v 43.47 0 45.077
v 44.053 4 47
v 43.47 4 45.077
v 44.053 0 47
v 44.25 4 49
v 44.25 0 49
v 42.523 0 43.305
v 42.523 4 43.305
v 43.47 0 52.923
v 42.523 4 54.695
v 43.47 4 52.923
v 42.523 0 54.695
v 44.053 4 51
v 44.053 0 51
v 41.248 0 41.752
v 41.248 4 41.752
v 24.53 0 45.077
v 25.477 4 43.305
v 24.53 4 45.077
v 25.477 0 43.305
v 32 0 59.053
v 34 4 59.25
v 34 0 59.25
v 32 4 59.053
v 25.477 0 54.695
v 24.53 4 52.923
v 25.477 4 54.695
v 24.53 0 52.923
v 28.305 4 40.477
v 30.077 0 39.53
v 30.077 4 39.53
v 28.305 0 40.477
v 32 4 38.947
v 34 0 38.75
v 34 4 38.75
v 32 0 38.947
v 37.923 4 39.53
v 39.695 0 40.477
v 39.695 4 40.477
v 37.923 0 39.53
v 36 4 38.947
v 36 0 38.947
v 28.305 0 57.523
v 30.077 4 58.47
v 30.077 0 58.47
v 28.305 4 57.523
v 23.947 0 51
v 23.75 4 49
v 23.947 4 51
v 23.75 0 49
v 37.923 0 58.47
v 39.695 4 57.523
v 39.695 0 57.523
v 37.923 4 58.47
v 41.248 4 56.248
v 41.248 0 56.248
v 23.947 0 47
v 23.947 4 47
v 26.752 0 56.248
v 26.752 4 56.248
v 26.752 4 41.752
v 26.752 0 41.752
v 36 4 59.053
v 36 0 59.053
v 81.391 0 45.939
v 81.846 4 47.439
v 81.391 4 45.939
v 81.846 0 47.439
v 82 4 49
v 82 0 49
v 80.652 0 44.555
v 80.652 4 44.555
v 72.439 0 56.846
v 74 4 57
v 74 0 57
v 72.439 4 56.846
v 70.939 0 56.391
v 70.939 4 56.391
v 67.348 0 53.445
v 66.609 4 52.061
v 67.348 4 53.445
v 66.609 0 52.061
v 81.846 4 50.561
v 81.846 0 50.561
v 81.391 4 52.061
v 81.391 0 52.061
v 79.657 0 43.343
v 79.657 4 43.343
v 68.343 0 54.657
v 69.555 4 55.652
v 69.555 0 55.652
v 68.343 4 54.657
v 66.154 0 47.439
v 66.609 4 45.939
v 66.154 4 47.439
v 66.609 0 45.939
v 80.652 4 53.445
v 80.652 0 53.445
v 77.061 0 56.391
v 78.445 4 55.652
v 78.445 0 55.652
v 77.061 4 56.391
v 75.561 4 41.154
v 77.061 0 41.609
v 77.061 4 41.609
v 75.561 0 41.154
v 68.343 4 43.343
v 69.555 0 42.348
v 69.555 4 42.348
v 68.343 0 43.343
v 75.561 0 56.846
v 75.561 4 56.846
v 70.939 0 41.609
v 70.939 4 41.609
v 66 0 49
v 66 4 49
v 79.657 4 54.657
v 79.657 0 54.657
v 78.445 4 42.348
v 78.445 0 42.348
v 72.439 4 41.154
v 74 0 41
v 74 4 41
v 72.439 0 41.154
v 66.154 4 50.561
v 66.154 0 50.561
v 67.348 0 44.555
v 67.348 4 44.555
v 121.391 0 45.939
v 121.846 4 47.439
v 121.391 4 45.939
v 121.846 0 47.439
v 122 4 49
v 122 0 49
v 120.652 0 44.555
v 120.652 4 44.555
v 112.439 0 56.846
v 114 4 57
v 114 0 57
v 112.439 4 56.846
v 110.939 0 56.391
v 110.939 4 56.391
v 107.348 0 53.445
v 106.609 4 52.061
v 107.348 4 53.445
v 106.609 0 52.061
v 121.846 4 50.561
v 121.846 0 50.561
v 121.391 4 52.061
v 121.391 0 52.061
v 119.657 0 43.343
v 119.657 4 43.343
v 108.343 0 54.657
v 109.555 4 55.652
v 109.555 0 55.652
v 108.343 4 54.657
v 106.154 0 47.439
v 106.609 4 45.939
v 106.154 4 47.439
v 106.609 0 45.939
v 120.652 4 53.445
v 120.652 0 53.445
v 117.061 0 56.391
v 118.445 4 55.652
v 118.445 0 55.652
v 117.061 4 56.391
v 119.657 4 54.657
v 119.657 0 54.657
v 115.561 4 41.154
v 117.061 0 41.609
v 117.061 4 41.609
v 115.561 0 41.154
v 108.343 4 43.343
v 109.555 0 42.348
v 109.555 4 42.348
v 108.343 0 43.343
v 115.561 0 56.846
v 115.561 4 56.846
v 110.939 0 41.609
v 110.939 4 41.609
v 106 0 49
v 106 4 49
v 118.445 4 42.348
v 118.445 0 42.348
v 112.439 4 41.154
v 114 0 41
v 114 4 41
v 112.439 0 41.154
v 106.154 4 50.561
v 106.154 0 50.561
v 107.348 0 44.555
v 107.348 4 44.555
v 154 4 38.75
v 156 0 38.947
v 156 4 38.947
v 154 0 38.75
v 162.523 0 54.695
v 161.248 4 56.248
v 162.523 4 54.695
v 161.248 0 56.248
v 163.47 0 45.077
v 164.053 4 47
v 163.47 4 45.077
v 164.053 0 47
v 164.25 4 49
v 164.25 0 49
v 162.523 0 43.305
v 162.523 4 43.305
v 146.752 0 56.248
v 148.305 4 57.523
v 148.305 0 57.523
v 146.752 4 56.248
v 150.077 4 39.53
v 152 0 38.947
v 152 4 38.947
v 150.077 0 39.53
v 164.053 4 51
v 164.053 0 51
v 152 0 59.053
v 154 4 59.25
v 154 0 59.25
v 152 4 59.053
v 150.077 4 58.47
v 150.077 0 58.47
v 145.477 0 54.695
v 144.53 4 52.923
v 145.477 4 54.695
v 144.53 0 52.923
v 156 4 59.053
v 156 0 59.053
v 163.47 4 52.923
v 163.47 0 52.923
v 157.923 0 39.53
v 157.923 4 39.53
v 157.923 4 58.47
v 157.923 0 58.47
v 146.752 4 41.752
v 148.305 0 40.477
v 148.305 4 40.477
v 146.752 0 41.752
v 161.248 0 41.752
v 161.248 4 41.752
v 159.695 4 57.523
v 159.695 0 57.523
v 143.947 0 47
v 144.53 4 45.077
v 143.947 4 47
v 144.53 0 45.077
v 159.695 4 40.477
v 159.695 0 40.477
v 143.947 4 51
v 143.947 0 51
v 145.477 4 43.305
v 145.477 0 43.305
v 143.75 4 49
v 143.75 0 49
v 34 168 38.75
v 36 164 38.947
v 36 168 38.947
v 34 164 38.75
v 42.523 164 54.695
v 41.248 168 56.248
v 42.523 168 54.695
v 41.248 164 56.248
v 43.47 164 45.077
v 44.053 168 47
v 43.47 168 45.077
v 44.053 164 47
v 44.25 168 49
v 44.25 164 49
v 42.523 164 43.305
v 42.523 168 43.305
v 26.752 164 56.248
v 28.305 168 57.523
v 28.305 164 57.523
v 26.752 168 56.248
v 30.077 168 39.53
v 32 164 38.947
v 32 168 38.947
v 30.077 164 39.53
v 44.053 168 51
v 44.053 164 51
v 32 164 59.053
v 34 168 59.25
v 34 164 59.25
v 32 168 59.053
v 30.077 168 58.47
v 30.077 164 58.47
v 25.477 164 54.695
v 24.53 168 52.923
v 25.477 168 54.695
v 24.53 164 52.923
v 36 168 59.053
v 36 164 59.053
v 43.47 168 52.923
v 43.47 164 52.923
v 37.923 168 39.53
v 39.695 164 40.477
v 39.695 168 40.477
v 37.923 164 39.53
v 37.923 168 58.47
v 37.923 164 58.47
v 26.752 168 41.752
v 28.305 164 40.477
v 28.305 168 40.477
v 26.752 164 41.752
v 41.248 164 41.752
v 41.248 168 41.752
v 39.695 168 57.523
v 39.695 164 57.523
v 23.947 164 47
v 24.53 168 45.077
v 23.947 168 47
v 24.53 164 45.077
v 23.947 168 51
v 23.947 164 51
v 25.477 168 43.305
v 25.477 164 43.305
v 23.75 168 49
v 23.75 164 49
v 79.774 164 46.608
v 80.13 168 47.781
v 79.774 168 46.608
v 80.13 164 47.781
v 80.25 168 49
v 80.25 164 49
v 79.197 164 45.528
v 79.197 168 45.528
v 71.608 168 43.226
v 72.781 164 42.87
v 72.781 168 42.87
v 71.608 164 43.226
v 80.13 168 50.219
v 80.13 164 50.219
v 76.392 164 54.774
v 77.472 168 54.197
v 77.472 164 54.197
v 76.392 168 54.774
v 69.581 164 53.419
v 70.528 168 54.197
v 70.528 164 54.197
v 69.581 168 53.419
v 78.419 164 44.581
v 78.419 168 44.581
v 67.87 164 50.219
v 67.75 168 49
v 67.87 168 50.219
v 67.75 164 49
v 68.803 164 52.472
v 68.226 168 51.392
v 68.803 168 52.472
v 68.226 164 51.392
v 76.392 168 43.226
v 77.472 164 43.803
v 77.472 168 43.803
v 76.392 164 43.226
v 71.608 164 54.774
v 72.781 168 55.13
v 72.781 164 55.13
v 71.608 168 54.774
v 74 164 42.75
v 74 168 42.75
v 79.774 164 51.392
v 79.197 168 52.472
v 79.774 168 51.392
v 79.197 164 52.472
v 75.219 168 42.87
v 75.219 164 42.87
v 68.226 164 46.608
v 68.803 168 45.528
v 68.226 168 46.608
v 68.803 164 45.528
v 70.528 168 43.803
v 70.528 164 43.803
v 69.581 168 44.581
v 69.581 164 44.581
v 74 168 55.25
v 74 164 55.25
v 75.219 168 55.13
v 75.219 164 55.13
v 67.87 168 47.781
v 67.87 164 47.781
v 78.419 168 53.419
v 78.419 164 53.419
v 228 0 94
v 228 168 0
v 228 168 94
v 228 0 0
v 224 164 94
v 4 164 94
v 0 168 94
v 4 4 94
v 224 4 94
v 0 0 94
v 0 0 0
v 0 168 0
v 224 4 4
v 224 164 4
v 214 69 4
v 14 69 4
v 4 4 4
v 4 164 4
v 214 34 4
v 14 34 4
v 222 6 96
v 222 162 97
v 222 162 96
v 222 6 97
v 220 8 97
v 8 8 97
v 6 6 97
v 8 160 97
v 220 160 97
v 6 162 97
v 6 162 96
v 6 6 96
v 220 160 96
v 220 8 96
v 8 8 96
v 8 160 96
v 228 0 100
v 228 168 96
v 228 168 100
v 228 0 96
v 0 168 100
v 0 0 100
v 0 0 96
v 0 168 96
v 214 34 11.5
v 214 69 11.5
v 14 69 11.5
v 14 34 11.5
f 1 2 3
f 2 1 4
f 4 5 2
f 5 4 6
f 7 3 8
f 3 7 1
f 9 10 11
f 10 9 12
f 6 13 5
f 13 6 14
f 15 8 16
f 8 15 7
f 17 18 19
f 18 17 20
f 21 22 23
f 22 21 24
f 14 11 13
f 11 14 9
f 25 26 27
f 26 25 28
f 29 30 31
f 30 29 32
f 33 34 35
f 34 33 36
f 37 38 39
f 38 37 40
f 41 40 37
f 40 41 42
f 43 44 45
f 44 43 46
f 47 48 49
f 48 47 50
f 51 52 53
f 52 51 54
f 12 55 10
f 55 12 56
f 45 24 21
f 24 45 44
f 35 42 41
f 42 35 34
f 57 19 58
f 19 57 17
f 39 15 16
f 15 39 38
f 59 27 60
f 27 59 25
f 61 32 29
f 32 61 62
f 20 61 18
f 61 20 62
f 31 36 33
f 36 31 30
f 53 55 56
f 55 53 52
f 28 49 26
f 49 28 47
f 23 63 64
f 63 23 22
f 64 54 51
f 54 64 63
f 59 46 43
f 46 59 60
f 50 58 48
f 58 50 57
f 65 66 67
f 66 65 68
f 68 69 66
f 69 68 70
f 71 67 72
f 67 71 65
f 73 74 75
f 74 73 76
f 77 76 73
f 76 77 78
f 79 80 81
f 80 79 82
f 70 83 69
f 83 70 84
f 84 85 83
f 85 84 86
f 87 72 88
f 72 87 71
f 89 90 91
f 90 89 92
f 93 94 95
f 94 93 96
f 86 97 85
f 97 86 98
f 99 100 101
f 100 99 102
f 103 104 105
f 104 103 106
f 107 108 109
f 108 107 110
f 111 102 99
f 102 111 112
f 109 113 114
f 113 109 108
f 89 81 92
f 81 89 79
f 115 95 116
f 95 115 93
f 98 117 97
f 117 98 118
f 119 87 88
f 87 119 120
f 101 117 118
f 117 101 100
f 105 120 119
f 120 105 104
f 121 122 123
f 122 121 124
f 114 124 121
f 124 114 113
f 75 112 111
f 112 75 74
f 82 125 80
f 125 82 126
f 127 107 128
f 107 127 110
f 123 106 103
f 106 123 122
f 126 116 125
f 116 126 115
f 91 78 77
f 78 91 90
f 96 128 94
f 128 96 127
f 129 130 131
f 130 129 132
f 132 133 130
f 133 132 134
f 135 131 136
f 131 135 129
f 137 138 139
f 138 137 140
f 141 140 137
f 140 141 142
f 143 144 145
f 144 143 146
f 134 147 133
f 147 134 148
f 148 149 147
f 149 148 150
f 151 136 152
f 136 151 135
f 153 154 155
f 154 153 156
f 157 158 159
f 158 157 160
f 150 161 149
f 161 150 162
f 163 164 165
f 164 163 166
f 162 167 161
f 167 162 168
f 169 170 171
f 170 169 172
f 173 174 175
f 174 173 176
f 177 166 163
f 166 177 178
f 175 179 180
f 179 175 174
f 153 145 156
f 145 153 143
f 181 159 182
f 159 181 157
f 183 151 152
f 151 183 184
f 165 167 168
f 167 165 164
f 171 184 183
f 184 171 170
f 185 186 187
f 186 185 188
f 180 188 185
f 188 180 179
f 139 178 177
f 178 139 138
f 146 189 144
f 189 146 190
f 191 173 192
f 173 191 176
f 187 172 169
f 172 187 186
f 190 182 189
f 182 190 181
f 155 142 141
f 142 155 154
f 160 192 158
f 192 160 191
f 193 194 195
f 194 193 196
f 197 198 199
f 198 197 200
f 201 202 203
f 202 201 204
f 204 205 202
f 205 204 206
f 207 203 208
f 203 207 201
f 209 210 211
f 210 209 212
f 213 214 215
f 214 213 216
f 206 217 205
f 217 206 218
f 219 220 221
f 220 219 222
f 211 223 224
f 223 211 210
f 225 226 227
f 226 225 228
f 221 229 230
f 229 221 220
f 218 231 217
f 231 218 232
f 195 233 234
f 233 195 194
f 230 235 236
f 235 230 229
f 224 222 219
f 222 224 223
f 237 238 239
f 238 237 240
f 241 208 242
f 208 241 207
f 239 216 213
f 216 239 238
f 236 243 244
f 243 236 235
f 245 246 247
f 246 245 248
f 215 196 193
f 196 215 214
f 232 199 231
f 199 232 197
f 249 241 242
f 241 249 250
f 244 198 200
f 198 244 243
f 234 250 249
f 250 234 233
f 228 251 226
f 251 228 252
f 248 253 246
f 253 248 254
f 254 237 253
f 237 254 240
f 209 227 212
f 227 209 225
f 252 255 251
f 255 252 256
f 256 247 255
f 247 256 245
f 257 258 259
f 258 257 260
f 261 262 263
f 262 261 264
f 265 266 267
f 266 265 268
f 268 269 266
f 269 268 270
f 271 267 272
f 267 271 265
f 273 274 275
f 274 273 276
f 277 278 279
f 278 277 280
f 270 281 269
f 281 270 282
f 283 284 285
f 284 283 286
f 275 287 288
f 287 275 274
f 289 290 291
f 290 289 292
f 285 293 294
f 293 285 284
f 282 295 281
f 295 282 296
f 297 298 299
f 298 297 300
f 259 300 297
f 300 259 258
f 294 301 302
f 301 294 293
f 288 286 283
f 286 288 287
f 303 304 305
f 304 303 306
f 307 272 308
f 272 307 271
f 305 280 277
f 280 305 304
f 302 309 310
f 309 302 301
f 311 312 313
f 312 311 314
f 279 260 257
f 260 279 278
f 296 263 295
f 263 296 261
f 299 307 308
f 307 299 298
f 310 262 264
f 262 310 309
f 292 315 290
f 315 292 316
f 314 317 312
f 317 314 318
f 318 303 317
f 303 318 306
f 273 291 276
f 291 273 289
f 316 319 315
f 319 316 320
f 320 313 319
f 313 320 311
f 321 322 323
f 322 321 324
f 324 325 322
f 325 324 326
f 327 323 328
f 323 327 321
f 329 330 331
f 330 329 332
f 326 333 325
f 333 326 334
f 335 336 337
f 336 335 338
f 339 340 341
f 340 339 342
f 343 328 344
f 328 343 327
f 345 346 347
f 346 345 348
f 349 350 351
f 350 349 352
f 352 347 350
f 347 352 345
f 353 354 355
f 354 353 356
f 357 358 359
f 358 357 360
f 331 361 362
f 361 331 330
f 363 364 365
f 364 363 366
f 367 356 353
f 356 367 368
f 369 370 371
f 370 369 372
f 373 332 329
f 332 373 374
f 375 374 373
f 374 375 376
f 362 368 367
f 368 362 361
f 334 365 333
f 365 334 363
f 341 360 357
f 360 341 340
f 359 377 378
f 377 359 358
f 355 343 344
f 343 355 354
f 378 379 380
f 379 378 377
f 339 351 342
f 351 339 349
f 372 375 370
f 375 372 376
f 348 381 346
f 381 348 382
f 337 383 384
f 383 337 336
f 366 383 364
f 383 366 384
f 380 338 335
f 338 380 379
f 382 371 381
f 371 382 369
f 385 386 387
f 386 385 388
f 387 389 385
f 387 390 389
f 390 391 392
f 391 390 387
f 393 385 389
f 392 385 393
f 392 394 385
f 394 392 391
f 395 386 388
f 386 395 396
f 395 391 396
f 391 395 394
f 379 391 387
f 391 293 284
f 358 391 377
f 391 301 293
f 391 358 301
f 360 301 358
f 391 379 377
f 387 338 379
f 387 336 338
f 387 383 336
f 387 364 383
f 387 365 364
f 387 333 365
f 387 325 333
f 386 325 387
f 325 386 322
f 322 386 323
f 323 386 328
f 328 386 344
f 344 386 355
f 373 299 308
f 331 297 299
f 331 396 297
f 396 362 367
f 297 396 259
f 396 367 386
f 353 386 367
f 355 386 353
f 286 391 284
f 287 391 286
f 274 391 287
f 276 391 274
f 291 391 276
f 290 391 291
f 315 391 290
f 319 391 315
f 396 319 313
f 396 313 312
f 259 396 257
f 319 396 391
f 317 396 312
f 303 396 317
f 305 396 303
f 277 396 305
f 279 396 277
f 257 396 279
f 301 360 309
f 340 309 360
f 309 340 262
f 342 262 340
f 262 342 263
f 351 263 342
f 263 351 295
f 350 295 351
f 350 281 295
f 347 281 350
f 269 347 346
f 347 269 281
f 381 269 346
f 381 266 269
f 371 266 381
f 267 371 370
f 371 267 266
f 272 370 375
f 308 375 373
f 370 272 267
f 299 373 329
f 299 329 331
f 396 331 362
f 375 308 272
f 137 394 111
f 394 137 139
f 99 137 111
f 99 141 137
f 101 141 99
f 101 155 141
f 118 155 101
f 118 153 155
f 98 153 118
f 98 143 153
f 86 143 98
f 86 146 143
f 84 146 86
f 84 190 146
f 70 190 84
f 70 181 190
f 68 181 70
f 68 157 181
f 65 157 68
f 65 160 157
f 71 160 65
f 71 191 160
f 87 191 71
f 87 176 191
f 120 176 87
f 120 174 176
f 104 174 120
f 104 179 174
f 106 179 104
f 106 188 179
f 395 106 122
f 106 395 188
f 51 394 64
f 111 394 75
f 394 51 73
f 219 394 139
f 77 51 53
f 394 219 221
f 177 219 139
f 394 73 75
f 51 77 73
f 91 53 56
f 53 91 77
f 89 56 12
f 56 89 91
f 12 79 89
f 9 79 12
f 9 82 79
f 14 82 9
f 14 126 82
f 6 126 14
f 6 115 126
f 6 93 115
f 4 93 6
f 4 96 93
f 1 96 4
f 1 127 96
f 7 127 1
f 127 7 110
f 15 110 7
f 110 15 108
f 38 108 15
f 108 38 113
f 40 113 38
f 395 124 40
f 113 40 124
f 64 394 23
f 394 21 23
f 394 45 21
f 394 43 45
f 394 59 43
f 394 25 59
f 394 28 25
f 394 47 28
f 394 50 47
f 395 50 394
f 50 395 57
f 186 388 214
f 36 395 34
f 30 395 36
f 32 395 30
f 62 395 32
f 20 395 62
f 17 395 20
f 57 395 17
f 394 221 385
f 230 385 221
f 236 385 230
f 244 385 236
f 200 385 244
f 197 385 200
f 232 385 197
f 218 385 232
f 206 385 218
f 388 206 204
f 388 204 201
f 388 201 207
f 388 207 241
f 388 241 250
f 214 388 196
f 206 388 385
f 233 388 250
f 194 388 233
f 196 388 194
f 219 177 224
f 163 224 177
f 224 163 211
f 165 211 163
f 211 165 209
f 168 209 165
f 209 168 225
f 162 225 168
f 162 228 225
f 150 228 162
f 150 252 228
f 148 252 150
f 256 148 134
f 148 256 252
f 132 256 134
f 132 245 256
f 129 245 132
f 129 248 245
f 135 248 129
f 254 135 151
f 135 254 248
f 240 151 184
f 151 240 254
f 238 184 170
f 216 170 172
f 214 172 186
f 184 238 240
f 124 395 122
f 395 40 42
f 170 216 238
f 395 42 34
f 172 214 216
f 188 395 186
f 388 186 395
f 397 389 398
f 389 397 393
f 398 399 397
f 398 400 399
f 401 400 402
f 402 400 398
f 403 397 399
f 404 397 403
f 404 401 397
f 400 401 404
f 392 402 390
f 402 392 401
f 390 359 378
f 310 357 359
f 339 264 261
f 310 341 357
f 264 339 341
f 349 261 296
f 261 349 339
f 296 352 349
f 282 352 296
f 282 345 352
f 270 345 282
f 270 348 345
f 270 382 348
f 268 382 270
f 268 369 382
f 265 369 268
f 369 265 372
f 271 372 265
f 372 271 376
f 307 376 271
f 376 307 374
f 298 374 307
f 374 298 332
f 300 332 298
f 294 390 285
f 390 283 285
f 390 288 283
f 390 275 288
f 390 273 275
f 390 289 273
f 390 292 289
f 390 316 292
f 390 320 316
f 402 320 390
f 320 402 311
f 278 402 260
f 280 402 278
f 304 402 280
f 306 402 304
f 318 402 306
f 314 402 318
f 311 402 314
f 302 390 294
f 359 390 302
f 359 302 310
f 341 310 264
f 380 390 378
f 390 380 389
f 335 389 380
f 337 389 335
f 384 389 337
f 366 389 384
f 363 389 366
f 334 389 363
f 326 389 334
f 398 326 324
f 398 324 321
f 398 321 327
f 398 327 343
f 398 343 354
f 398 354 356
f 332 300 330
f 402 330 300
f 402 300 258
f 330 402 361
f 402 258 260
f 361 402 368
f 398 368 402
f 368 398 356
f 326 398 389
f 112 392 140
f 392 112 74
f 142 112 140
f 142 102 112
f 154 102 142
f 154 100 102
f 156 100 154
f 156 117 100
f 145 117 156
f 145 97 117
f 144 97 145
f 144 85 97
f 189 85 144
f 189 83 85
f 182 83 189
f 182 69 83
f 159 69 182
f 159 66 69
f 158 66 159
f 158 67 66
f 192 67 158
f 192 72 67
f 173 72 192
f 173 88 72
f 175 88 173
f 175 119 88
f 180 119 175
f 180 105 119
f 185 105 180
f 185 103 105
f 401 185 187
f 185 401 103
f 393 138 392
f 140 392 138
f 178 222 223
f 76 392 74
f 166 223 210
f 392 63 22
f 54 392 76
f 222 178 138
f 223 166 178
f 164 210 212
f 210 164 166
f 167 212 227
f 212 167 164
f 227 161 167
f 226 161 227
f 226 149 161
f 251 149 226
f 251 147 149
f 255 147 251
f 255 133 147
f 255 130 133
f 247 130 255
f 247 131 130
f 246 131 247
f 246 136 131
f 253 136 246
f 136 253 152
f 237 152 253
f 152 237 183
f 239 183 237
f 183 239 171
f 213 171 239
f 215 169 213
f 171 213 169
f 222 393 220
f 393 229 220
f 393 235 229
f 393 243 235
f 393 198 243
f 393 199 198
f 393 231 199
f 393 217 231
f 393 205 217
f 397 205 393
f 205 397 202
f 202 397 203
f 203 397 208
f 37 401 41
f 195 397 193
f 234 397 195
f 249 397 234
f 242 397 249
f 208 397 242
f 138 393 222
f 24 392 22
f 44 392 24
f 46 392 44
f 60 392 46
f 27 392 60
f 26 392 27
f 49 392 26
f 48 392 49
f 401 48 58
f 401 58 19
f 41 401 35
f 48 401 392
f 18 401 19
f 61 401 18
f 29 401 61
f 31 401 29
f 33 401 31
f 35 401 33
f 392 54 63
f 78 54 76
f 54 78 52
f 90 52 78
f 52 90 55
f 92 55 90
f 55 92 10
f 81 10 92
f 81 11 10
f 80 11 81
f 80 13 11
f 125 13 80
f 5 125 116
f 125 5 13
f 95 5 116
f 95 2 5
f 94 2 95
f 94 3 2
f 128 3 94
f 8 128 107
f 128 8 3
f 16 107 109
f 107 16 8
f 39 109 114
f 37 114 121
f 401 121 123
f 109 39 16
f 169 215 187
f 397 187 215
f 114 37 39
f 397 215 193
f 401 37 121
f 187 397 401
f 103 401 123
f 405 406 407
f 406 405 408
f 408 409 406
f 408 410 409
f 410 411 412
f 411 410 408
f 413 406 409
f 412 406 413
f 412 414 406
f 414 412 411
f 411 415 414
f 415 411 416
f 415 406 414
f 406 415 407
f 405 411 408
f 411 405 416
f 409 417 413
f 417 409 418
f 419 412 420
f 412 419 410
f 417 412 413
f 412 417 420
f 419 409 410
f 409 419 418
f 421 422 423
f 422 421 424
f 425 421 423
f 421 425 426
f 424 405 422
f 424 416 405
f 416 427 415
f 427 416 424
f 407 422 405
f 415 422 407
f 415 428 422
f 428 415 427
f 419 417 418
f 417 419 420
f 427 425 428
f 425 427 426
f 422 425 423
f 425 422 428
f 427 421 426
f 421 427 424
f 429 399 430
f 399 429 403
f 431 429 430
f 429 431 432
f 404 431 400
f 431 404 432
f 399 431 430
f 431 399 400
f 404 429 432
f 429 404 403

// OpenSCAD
// AquaKeeper — Electronics Enclosure (OpenSCAD)
// Parametric IP68 enclosure for the compute module and motor drivers.
//
// Units: millimeters

// =============================================================
// Parameters
// =============================================================

enclosure_w      = 220;    // mm (internal width)
enclosure_d      = 160;    // mm (internal depth)
enclosure_h      = 90;     // mm (internal height)
wall_thickness   = 4;      // mm
lid_lip          = 5;      // mm overlap

// Cable gland holes
gland_positions  = [
    [30,  0],   // Power in
    [70,  0],   // Camera L USB
    [110, 0],   // Camera R USB
    [150, 0],   // Motor H
    [30,  1],   // Motor V (opposite wall)
    [70,  1],   // E-stop (opposite wall)
];

gland_diameters  = [20.5, 16, 16, 20.5, 20.5, 12.5];  // PG11, PG9, PG9, PG11, PG11, PG7

// =============================================================
// Modules
// =============================================================

module enclosure_body() {
    color("LightGray")
    difference() {
        // Outer shell
        cube([
            enclosure_w + 2 * wall_thickness,
            enclosure_d + 2 * wall_thickness,
            enclosure_h + wall_thickness
        ]);

        // Inner cavity
        translate([wall_thickness, wall_thickness, wall_thickness])
        cube([enclosure_w, enclosure_d, enclosure_h + 1]);

        // Cable gland holes
        for (i = [0 : len(gland_positions) - 1]) {
            pos = gland_positions[i];
            d = gland_diameters[i];
            if (pos[1] == 0) {
                // Front wall
                translate([pos[0] + wall_thickness, -1, enclosure_h / 2 + wall_thickness])
                rotate([-90, 0, 0])
                cylinder(h=wall_thickness + 2, d=d, $fn=32);
            } else {
                // Rear wall
                translate([pos[0] + wall_thickness, enclosure_d + wall_thickness - 1, enclosure_h / 2 + wall_thickness])
                rotate([-90, 0, 0])
                cylinder(h=wall_thickness + 2, d=d, $fn=32);
            }
        }
    }
}

module enclosure_lid() {
    color("LightBlue", 0.5)
    translate([0, 0, enclosure_h + wall_thickness + 2])
    difference() {
        cube([
            enclosure_w + 2 * wall_thickness,
            enclosure_d + 2 * wall_thickness,
            wall_thickness
        ]);

        // Gasket groove (simplified)
        translate([wall_thickness + 2, wall_thickness + 2, -1])
        difference() {
            cube([enclosure_w - 4, enclosure_d - 4, 2]);
            translate([2, 2, 0])
            cube([enclosure_w - 8, enclosure_d - 8, 2]);
        }
    }
}

module din_rail(length) {
    // Simplified 35mm DIN rail
    color("Silver")
    translate([0, 0, 0])
    cube([length, 35, 7.5]);
}

// =============================================================
// Assembly
// =============================================================

module enclosure_assembly() {
    enclosure_body();
    enclosure_lid();

    // DIN rail inside
    translate([wall_thickness + 10, wall_thickness + 30, wall_thickness])
    din_rail(enclosure_w - 20);
}

enclosure_assembly();

echo("Enclosure rendered.");
echo(str("External dimensions: ",
    enclosure_w + 2 * wall_thickness, " x ",
    enclosure_d + 2 * wall_thickness, " x ",
    enclosure_h + 2 * wall_thickness, " mm"));
